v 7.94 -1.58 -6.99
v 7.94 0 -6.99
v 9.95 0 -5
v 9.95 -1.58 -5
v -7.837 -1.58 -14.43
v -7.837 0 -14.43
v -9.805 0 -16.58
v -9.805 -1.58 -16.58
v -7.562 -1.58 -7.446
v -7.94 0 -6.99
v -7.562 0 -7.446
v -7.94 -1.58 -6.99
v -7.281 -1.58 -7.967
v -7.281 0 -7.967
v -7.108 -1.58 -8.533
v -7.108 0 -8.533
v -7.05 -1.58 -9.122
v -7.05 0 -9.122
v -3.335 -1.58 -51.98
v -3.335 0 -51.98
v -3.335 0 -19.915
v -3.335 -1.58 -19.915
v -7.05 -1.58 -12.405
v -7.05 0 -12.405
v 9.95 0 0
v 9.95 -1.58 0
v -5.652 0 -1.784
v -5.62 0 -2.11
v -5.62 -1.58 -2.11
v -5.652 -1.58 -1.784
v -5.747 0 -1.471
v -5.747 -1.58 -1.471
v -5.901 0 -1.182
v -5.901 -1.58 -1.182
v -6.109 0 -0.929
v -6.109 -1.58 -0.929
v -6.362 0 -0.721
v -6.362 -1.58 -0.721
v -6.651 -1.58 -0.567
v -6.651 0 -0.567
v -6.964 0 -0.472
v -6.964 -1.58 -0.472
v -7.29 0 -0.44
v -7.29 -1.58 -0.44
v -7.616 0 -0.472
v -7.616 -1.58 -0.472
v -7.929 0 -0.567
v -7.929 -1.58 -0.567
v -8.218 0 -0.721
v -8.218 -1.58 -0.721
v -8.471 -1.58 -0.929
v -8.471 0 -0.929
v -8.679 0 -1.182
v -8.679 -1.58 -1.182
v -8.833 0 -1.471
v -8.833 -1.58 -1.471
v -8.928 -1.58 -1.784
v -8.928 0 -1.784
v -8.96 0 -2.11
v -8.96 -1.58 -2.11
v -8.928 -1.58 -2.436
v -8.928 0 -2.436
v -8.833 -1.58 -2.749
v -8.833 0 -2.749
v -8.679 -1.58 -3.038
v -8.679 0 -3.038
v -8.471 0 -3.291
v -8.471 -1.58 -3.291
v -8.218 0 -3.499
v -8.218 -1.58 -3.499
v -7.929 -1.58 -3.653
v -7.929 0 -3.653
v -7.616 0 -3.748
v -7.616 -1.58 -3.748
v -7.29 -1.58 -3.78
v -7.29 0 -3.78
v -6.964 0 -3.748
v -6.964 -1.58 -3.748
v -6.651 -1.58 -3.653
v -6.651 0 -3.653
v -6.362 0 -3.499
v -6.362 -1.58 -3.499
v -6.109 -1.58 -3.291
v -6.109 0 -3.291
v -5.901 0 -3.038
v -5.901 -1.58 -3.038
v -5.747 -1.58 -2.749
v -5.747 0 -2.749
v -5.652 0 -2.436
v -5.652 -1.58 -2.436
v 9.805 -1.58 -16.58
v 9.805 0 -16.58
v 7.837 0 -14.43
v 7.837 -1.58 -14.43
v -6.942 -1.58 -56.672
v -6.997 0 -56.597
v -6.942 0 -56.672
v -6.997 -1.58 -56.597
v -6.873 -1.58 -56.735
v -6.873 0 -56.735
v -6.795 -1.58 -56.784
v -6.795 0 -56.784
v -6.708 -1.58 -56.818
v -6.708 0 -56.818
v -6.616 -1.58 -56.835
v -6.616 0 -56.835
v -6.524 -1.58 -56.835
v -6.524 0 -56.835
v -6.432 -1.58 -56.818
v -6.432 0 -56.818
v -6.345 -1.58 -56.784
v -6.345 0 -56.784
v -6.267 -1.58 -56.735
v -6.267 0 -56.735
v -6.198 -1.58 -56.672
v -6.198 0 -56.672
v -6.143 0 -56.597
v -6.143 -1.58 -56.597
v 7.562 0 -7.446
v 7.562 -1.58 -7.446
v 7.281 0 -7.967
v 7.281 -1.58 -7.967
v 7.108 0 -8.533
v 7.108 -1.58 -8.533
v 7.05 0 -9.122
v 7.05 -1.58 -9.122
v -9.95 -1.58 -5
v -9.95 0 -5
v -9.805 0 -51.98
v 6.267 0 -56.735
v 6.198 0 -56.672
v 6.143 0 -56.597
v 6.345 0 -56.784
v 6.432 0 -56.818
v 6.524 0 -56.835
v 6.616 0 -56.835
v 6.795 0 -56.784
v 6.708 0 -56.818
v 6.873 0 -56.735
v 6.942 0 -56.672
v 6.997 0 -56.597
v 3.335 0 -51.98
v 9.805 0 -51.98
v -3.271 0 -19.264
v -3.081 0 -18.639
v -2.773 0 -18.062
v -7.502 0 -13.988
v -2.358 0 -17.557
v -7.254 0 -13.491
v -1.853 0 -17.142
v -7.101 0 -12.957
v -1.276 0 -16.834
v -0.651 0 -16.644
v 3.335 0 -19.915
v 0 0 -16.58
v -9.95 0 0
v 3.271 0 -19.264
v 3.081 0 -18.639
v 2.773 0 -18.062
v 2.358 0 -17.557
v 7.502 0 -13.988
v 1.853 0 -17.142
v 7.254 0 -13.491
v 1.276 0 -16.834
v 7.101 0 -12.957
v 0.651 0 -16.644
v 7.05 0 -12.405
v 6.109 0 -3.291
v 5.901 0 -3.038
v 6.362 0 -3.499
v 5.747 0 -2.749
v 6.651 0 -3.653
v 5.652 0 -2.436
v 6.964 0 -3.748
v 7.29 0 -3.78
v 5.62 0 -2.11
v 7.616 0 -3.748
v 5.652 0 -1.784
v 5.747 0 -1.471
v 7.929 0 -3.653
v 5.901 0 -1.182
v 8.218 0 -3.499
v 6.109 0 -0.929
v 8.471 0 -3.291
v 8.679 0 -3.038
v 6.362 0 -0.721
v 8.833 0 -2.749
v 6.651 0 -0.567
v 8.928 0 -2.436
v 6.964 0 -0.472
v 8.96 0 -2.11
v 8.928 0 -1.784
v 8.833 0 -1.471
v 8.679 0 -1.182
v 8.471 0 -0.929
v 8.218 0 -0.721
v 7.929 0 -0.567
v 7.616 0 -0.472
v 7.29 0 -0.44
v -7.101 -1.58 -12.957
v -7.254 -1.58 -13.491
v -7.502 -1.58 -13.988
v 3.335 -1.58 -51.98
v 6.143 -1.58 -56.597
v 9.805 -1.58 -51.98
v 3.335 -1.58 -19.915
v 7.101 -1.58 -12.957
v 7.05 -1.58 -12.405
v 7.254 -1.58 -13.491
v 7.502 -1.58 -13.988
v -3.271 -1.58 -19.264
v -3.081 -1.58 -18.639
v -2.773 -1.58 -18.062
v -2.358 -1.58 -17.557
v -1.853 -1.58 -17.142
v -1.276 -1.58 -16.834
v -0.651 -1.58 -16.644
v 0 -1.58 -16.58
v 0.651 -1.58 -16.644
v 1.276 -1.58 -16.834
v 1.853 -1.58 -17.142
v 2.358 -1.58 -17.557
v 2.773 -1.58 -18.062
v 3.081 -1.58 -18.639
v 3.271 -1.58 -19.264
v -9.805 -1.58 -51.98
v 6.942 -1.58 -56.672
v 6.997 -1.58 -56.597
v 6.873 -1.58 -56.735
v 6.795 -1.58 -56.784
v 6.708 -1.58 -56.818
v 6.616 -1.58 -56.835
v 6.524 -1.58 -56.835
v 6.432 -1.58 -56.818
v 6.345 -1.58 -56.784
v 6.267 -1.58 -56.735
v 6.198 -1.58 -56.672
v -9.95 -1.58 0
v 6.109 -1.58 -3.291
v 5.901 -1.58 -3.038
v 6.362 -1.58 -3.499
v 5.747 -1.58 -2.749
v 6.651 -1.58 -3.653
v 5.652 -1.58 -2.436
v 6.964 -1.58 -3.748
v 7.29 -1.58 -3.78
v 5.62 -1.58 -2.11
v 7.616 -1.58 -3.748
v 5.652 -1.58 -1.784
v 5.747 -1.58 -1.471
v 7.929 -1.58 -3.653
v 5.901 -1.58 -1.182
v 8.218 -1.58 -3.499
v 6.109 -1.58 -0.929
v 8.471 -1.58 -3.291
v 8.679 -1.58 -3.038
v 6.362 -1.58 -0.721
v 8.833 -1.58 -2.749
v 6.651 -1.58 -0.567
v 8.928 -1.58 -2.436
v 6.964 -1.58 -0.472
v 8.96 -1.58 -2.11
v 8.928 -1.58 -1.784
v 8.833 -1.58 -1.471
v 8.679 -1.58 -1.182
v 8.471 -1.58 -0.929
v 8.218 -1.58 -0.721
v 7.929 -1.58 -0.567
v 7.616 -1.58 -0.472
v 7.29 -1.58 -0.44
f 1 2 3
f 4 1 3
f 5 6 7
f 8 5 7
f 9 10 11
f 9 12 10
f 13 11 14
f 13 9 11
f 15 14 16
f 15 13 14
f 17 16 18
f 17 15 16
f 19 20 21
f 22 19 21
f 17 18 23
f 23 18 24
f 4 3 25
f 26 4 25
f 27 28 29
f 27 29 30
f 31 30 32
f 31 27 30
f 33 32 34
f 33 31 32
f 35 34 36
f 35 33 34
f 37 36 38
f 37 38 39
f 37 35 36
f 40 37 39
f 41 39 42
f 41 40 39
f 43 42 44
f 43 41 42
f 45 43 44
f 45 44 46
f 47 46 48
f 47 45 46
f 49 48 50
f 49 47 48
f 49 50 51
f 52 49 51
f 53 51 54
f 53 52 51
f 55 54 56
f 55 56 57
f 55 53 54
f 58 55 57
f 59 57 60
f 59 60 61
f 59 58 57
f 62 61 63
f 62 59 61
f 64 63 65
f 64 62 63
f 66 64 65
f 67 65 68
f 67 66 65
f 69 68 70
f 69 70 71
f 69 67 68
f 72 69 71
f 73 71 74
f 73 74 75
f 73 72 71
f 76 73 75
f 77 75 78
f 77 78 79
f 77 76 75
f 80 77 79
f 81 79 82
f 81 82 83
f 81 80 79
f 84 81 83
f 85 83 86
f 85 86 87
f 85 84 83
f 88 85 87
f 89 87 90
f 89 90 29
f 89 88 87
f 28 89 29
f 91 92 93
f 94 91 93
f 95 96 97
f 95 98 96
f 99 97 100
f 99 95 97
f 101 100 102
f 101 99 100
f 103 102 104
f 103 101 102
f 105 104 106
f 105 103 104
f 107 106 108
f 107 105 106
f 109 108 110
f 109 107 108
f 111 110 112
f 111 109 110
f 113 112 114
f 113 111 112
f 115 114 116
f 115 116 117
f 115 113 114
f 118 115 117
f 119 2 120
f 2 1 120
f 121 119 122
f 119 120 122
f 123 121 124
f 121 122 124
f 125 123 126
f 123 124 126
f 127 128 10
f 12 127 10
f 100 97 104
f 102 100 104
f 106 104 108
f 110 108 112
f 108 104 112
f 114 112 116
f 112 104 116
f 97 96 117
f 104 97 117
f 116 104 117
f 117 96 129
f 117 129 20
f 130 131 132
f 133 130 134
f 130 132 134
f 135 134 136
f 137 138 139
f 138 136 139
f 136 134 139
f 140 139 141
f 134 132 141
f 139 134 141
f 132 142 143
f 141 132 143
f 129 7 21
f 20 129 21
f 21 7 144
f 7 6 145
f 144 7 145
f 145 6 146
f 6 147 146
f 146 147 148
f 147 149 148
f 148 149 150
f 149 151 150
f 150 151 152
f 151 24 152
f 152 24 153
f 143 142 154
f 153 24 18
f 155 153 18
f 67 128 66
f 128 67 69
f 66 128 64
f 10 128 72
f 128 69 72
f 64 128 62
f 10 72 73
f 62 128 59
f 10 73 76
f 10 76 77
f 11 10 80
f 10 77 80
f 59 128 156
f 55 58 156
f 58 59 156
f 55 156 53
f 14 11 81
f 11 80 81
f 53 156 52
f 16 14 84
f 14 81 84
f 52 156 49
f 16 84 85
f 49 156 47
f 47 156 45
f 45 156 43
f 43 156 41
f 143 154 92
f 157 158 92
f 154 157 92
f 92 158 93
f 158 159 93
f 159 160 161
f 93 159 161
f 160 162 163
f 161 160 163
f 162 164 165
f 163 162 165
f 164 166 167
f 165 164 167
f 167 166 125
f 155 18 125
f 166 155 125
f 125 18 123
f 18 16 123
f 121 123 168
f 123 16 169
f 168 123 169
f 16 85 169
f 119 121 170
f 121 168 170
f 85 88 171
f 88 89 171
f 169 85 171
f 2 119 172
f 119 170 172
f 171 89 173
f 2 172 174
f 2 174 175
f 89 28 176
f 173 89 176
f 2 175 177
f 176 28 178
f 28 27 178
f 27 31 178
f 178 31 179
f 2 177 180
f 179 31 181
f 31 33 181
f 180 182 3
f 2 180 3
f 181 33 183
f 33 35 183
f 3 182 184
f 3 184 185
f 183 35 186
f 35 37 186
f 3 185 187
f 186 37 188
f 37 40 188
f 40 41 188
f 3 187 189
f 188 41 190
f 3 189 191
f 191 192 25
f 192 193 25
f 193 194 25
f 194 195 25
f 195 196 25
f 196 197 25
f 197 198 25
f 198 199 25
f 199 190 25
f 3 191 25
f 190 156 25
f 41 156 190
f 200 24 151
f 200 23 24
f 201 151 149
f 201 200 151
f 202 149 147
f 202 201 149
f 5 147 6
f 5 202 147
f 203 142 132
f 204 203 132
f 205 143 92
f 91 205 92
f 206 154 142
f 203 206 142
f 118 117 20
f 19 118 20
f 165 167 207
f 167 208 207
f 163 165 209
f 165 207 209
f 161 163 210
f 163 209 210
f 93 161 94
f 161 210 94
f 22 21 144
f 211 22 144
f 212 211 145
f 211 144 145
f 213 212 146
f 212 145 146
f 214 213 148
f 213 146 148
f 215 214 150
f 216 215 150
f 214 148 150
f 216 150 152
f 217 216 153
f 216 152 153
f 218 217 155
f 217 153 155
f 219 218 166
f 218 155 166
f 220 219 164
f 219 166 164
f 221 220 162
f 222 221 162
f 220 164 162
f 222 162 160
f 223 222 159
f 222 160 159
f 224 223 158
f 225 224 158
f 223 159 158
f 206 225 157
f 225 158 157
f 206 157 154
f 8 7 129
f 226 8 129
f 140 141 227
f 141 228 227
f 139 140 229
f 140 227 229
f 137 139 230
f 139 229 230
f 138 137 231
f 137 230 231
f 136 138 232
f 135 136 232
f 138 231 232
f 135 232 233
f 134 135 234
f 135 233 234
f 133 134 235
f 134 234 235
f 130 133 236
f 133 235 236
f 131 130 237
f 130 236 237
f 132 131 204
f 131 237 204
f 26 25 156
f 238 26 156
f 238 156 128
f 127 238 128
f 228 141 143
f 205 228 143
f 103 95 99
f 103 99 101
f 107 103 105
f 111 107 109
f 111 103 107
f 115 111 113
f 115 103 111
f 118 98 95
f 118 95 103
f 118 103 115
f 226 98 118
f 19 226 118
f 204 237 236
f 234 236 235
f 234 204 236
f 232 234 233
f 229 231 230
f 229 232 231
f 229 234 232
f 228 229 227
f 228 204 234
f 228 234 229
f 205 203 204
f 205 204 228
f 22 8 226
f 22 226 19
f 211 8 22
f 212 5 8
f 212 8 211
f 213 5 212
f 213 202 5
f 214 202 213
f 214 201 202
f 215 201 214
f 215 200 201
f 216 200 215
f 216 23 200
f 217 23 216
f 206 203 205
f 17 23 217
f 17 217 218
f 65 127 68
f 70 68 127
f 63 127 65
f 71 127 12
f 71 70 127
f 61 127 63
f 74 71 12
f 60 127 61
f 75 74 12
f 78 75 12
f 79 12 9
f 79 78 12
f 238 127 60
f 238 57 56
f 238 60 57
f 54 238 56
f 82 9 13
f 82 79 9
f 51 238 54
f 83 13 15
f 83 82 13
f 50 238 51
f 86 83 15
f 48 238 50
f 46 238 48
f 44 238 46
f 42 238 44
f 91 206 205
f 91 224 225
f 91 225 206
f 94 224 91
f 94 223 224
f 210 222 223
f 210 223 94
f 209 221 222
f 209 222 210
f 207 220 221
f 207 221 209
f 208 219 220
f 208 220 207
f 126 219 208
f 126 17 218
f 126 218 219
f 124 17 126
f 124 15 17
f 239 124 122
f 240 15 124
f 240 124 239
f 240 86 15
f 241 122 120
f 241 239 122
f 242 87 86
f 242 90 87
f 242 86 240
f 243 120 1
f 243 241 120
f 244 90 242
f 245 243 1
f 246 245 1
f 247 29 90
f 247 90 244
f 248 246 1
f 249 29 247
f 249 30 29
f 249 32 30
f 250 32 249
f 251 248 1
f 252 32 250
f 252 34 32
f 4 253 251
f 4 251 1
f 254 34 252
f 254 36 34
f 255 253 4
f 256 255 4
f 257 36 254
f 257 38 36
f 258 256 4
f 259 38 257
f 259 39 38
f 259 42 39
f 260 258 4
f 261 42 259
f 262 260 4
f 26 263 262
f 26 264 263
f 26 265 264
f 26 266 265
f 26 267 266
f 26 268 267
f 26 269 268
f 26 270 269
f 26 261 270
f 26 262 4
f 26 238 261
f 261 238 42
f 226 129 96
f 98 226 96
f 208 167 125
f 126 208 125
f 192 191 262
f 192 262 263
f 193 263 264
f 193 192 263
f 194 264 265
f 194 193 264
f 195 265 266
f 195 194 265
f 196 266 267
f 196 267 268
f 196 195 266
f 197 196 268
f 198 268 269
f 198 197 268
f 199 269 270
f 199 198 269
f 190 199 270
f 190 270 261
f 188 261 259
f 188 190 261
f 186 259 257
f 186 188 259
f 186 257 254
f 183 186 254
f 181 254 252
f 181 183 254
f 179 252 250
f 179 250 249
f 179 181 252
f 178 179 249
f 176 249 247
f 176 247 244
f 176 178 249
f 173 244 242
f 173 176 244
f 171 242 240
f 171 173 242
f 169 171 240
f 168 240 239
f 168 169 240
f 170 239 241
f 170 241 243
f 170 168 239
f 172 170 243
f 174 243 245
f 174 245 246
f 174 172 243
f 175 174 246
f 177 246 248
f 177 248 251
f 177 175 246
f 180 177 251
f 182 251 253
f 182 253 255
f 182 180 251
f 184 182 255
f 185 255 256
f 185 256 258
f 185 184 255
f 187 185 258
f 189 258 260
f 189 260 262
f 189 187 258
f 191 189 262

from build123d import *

# Parameters (mm, degrees)
F0_R     = 1.67
F1_DEPTH = 1.58
F2_R     = 3
F3_R     = 0.5


with BuildPart() as f1:
    # F0 (on Front) → F1 (new body)
    with BuildSketch(Plane.XZ):
        with BuildLine():
            Line((9.95, 0), (-9.95, 0))
            Line((-9.95, 0), (-9.95, -5))
            Line((-9.95, -5), (-7.05, -7.870274))
            Line((-7.05, -7.870274), (-7.05, -13.570274))
            Line((-7.05, -13.570274), (-9.805, -16.58))
            Line((-9.805, -16.58), (-9.805, -51.98))
            Line((-9.805, -51.98), (-6.57, -57.3))
            Line((-6.57, -57.3), (-3.335, -51.98))
            Line((-3.335, -51.98), (-3.335, -19.915))
            ThreePointArc((-3.335, -19.915), (0, -16.58), (3.335, -19.915))
            Line((3.335, -19.915), (3.335, -51.98))
            Line((3.335, -51.98), (6.57, -57.3))
            Line((6.57, -57.3), (9.805, -51.98))
            Line((9.805, -51.98), (9.805, -16.58))
            Line((9.805, -16.58), (7.05, -13.570274))
            Line((7.05, -13.570274), (7.05, -7.870274))
            Line((7.05, -7.870274), (9.95, -5))
            Line((9.95, -5), (9.95, 0))
        make_face()
        with Locations((-7.29, -2.11)):
            Circle(F0_R, mode=Mode.SUBTRACT)
        with Locations((7.29, -2.11)):
            Circle(F0_R, mode=Mode.SUBTRACT)
    extrude(amount=F1_DEPTH)

    # F2
    f2_edges = [f1.edges().sort_by_distance(p)[0] for p in [
        (-7.05, -0.79, -7.870274),
        (-7.05, -0.79, -13.570274),
        (7.05, -0.79, -7.870274),
        (7.05, -0.79, -13.570274),
    ]]
    fillet(f2_edges, radius=F2_R)

    # F3
    f3_edges = [f1.edges().sort_by_distance(p)[0] for p in [
        (-6.57, -0.79, -57.3),
        (6.57, -0.79, -57.3),
    ]]
    fillet(f3_edges, radius=F3_R)


solid = f1.part
